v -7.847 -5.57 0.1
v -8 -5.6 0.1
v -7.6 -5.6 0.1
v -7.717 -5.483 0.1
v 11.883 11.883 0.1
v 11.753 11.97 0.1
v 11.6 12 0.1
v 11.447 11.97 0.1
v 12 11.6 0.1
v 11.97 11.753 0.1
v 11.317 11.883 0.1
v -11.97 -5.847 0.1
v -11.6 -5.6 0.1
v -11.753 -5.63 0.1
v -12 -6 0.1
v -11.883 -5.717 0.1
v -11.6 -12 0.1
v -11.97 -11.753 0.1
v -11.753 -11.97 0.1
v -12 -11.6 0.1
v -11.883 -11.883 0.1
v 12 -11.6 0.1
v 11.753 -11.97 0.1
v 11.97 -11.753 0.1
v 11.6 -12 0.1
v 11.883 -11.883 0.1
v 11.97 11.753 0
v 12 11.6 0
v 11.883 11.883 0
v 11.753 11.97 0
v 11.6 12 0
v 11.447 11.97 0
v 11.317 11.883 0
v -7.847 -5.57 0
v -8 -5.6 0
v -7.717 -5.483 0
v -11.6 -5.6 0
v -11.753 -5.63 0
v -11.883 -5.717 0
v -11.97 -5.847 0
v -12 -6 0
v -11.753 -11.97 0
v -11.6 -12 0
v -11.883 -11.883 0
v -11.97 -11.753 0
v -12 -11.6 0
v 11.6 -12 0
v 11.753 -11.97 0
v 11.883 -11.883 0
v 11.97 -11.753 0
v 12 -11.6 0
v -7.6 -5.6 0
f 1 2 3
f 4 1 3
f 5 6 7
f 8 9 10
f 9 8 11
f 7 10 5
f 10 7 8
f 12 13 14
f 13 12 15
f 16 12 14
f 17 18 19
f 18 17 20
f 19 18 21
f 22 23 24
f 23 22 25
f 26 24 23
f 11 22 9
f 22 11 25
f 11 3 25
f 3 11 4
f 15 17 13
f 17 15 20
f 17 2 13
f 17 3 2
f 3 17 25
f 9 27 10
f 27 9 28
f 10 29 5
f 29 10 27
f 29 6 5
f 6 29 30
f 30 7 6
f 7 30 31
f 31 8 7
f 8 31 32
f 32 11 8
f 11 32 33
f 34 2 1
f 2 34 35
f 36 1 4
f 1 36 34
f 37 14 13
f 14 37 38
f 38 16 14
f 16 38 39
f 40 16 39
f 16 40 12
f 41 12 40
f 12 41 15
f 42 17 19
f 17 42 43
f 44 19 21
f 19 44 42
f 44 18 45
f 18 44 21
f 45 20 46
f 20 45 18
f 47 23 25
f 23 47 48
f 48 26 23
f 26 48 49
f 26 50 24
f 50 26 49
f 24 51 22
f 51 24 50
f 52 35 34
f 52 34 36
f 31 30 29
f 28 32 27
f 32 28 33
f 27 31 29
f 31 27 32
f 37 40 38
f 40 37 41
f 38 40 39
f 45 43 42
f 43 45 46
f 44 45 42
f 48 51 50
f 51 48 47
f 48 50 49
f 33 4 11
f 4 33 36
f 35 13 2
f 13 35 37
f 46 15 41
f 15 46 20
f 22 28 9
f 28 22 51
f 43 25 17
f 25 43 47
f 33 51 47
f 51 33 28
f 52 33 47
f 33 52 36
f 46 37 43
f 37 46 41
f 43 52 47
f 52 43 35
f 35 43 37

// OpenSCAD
// file: ../p/3-8cyli.scad
use <../lib.scad>
function ldraw_lib__3_8cyli() = [
// 0 Cylinder 0.375
// 0 Name: 3-8cyli.dat
// 0 Author: James Jessiman
// 0 !LDRAW_ORG Primitive UPDATE 2005-01
// 0 !LICENSE Licensed under CC BY 2.0 and CC BY 4.0 : see CAreadme.txt
// 
// 0 BFC CERTIFY CCW
  [0,"BFC","CERTIFY"],
  [0,"BFC","CCW"],
// 
// 0 !HISTORY 2002-05-08 [OrionP] Made BFC compliant
// 0 !HISTORY 2002-08-18 [PTadmin] Official Update 2002-04
// 0 !HISTORY 2004-12-11 [nielsk] Recreated using Primitive Generator, Edge lines fixed, BFC changed to CCW
// 0 !HISTORY 2005-12-28 [PTadmin] Official Update 2005-01
// 0 !HISTORY 2007-06-24 [PTadmin] Header formatted for Contributor Agreement
// 0 !HISTORY 2008-07-01 [PTadmin] Official Update 2008-01
// 
// 
// 4 16 .9239 1 .3827 .9239 0 .3827 1 0 0 1 1 0
  [4,16,.9239,1,.3827,.9239,0,.3827,1,0,0,1,1,0],
// 4 16 .7071 1 .7071 .7071 0 .7071 .9239 0 .3827 .9239 1 .3827
  [4,16,.7071,1,.7071,.7071,0,.7071,.9239,0,.3827,.9239,1,.3827],
// 4 16 .3827 1 .9239 .3827 0 .9239 .7071 0 .7071 .7071 1 .7071
  [4,16,.3827,1,.9239,.3827,0,.9239,.7071,0,.7071,.7071,1,.7071],
// 4 16 0 1 1 0 0 1 .3827 0 .9239 .3827 1 .9239
  [4,16,0,1,1,0,0,1,.3827,0,.9239,.3827,1,.9239],
// 4 16 -.3827 1 .9239 -.3827 0 .9239 0 0 1 0 1 1
  [4,16,-.3827,1,.9239,-.3827,0,.9239,0,0,1,0,1,1],
// 4 16 -.7071 1 .7071 -.7071 0 .7071 -.3827 0 .9239 -.3827 1 .9239
  [4,16,-.7071,1,.7071,-.7071,0,.7071,-.3827,0,.9239,-.3827,1,.9239],
// 5 24 1 1 0 1 0 0 1 1 -.4142 .9239 1 .3827
  [5,24,1,1,0,1,0,0,1,1,-.4142,.9239,1,.3827],
// 5 24 .9239 1 .3827 .9239 0 .3827 1 1 0 .7071 1 .7071
  [5,24,.9239,1,.3827,.9239,0,.3827,1,1,0,.7071,1,.7071],
// 5 24 .7071 1 .7071 .7071 0 .7071 .9239 1 .3827 .3827 1 .9239
  [5,24,.7071,1,.7071,.7071,0,.7071,.9239,1,.3827,.3827,1,.9239],
// 5 24 .3827 1 .9239 .3827 0 .9239 .7071 1 .7071 0 1 1
  [5,24,.3827,1,.9239,.3827,0,.9239,.7071,1,.7071,0,1,1],
// 5 24 0 1 1 0 0 1 .3827 1 .9239 -.3827 1 .9239
  [5,24,0,1,1,0,0,1,.3827,1,.9239,-.3827,1,.9239],
// 5 24 -.3827 1 .9239 -.3827 0 .9239 0 1 1 -.7071 1 .7071
  [5,24,-.3827,1,.9239,-.3827,0,.9239,0,1,1,-.7071,1,.7071],
// 5 24 -.7071 1 .7071 -.7071 0 .7071 -.3827 1 .9239 -1 1 .4142
  [5,24,-.7071,1,.7071,-.7071,0,.7071,-.3827,1,.9239,-1,1,.4142],
// 0
];
module ldraw_lib__3_8cyli(step=0, col=false, unit=2/5, alt=false, line=0.2, solid=!$preview)
    makepoly(ldraw_lib__3_8cyli(), step=step, col=col, unit=unit, alt=alt, line=line, solid=solid);
ldraw_lib__3_8cyli(line=0.2);
// file: ../p/3-8chrd.scad
use <../lib.scad>
function ldraw_lib__3_8chrd() = [
// 0 Chord 0.375
// 0 Name: 3-8chrd.dat
// 0 Author: Donald Sutter [technog]
// 0 !LDRAW_ORG Primitive UPDATE 2005-01
// 0 !LICENSE Licensed under CC BY 2.0 and CC BY 4.0 : see CAreadme.txt
// 
// 0 BFC CERTIFY CCW
  [0,"BFC","CERTIFY"],
  [0,"BFC","CCW"],
// 
// 0 !HISTORY 2004-01-07 [Steffen] added primitive code for POVray
// 0 !HISTORY 2004-03-18 [mkennedy] removed pov code and rearanged polygons.
// 0 !HISTORY 2004-09-12 [cwdee] reversed winding and standardised precision
// 0 !HISTORY 2005-12-28 [PTadmin] Official Update 2005-01
// 0 !HISTORY 2007-06-24 [PTadmin] Header formatted for Contributor Agreement
// 0 !HISTORY 2008-07-01 [PTadmin] Official Update 2008-01
// 
// 
// 3 16 0.7071 0 0.7071 0.3827 0 0.9239 0 0 1
  [3,16,0.7071,0,0.7071,0.3827,0,0.9239,0,0,1],
// 4 16 0.9239 0 0.3827 -0.3827 0 0.9239 -0.7071 0 0.7071 1 0 0
  [4,16,0.9239,0,0.3827,-0.3827,0,0.9239,-0.7071,0,0.7071,1,0,0],
// 4 16 0.7071 0 0.7071 0 0 1 -0.3827 0 0.9239 0.9239 0 0.3827
  [4,16,0.7071,0,0.7071,0,0,1,-0.3827,0,0.9239,0.9239,0,0.3827],
// 0
];
module ldraw_lib__3_8chrd(step=0, col=false, unit=2/5, alt=false, line=0.2, solid=!$preview)
    makepoly(ldraw_lib__3_8chrd(), step=step, col=col, unit=unit, alt=alt, line=line, solid=solid);
ldraw_lib__3_8chrd(line=0.2);
// file: ../p/1-8ndis.scad
use <../lib.scad>
function ldraw_lib__1_8ndis() = [
// 0 Disc Negative 0.125
// 0 Name: 1-8ndis.dat
// 0 Author: James Jessiman
// 0 !LDRAW_ORG Primitive UPDATE 2012-01
// 0 !LICENSE Licensed under CC BY 2.0 and CC BY 4.0 : see CAreadme.txt
// 
// 0 BFC CERTIFY CCW
  [0,"BFC","CERTIFY"],
  [0,"BFC","CCW"],
// 
// 0 !HISTORY 2002-03-23 [sbliss] Added BFC statement
// 0 !HISTORY 2002-04-25 [PTadmin] Official Update 2002-02
// 0 !HISTORY 2007-06-22 [PTadmin] Header formatted for Contributor Agreement
// 0 !HISTORY 2008-07-01 [PTadmin] Official Update 2008-01
// 0 !HISTORY 2012-02-16 [Philo] Changed to CCW
// 0 !HISTORY 2012-03-30 [PTadmin] Official Update 2012-01
// 
// 
// 3 16 0.9239 0 0.3827 1 0 0 1 0 1
  [3,16,0.9239,0,0.3827,1,0,0,1,0,1],
// 3 16 0.7071 0 0.7071 0.9239 0 0.3827 1 0 1
  [3,16,0.7071,0,0.7071,0.9239,0,0.3827,1,0,1],
];
module ldraw_lib__1_8ndis(step=0, col=false, unit=2/5, alt=false, line=0.2, solid=!$preview)
    makepoly(ldraw_lib__1_8ndis(), step=step, col=col, unit=unit, alt=alt, line=line, solid=solid);
ldraw_lib__1_8ndis(line=0.2);
// file: ../p/1-8cyli.scad
use <../lib.scad>
function ldraw_lib__1_8cyli() = [
// 0 Cylinder 0.125
// 0 Name: 1-8cyli.dat
// 0 Author: James Jessiman
// 0 !LDRAW_ORG Primitive UPDATE 2005-01
// 0 !LICENSE Licensed under CC BY 2.0 and CC BY 4.0 : see CAreadme.txt
// 
// 0 BFC CERTIFY CCW
  [0,"BFC","CERTIFY"],
  [0,"BFC","CCW"],
// 
// 0 !HISTORY 2002-04-25 [PTadmin] Official Update 2002-02
// 0 !HISTORY 2004-12-11 [nielsk] Recreated using Primitive Generator, Edge lines fixed, BFC changed to CCW
// 0 !HISTORY 2005-12-28 [PTadmin] Official Update 2005-01
// 0 !HISTORY 2007-06-22 [PTadmin] Header formatted for Contributor Agreement
// 0 !HISTORY 2008-07-01 [PTadmin] Official Update 2008-01
// 
// 
// 4 16 .9239 1 .3827 .9239 0 .3827 1 0 0 1 1 0
  [4,16,.9239,1,.3827,.9239,0,.3827,1,0,0,1,1,0],
// 4 16 .7071 1 .7071 .7071 0 .7071 .9239 0 .3827 .9239 1 .3827
  [4,16,.7071,1,.7071,.7071,0,.7071,.9239,0,.3827,.9239,1,.3827],
// 5 24 1 1 0 1 0 0 1 1 -.4142 .9239 1 .3827
  [5,24,1,1,0,1,0,0,1,1,-.4142,.9239,1,.3827],
// 5 24 .9239 1 .3827 .9239 0 .3827 1 1 0 .7071 1 .7071
  [5,24,.9239,1,.3827,.9239,0,.3827,1,1,0,.7071,1,.7071],
// 5 24 .7071 1 .7071 .7071 0 .7071 .9239 1 .3827 .4142 1 1
  [5,24,.7071,1,.7071,.7071,0,.7071,.9239,1,.3827,.4142,1,1],
// 0
];
module ldraw_lib__1_8cyli(step=0, col=false, unit=2/5, alt=false, line=0.2, solid=!$preview)
    makepoly(ldraw_lib__1_8cyli(), step=step, col=col, unit=unit, alt=alt, line=line, solid=solid);
ldraw_lib__1_8cyli(line=0.2);
// file: ../p/1-4cyli.scad
use <../lib.scad>
function ldraw_lib__1_4cyli() = [
// 0 Cylinder 0.25
// 0 Name: 1-4cyli.dat
// 0 Author: James Jessiman
// 0 !LDRAW_ORG Primitive UPDATE 2012-01
// 0 !LICENSE Licensed under CC BY 2.0 and CC BY 4.0 : see CAreadme.txt
// 
// 0 BFC CERTIFY CCW
  [0,"BFC","CERTIFY"],
  [0,"BFC","CCW"],
// 
// 0 !HISTORY 2002-03-23 [sbliss] Added BFC statement.
// 0 !HISTORY 2002-04-25 [PTadmin] Official Update 2002-02
// 0 !HISTORY 2007-06-22 [PTadmin] Header formatted for Contributor Agreement
// 0 !HISTORY 2008-07-01 [PTadmin] Official Update 2008-01
// 0 !HISTORY 2012-02-16 [Philo] Changed to CCW
// 0 !HISTORY 2012-03-30 [PTadmin] Official Update 2012-01
// 
// 
// 4 16 1 1 0 0.9239 1 0.3827 0.9239 0 0.3827 1 0 0
  [4,16,1,1,0,0.9239,1,0.3827,0.9239,0,0.3827,1,0,0],
// 5 24 1 0 0 1 1 0 0.9239 0 0.3827 1 0 -1
  [5,24,1,0,0,1,1,0,0.9239,0,0.3827,1,0,-1],
// 4 16 0.9239 1 0.3827 0.7071 1 0.7071 0.7071 0 0.7071 0.9239 0 0.3827
  [4,16,0.9239,1,0.3827,0.7071,1,0.7071,0.7071,0,0.7071,0.9239,0,0.3827],
// 5 24 0.9239 0 0.3827 0.9239 1 0.3827 0.7071 0 0.7071 1 0 0
  [5,24,0.9239,0,0.3827,0.9239,1,0.3827,0.7071,0,0.7071,1,0,0],
// 4 16 0.7071 1 0.7071 0.3827 1 0.9239 0.3827 0 0.9239 0.7071 0 0.7071
  [4,16,0.7071,1,0.7071,0.3827,1,0.9239,0.3827,0,0.9239,0.7071,0,0.7071],
// 5 24 0.7071 0 0.7071 0.7071 1 0.7071 0.3827 0 0.9239 0.9239 0 0.3827
  [5,24,0.7071,0,0.7071,0.7071,1,0.7071,0.3827,0,0.9239,0.9239,0,0.3827],
// 4 16 0.3827 1 0.9239 0 1 1 0 0 1 0.3827 0 0.9239
  [4,16,0.3827,1,0.9239,0,1,1,0,0,1,0.3827,0,0.9239],
// 5 24 0.3827 0 0.9239 0.3827 1 0.9239 0 0 1 0.7071 0 0.7071
  [5,24,0.3827,0,0.9239,0.3827,1,0.9239,0,0,1,0.7071,0,0.7071],
// 5 24 0 0 1 0 1 1 0.3827 0 0.9239 -1 0 1
  [5,24,0,0,1,0,1,1,0.3827,0,0.9239,-1,0,1],
];
module ldraw_lib__1_4cyli(step=0, col=false, unit=2/5, alt=false, line=0.2, solid=!$preview)
    makepoly(ldraw_lib__1_4cyli(), step=step, col=col, unit=unit, alt=alt, line=line, solid=solid);
ldraw_lib__1_4cyli(line=0.2);
// file: ../p/1-4chrd.scad
use <../lib.scad>
function ldraw_lib__1_4chrd() = [
// 0 Chord 0.25
// 0 Name: 1-4chrd.dat
// 0 Author: Tony Hafner [hafhead]
// 0 !LDRAW_ORG Primitive UPDATE 2012-02
// 0 !LICENSE Licensed under CC BY 2.0 and CC BY 4.0 : see CAreadme.txt
// 
// 0 BFC CERTIFY CCW
  [0,"BFC","CERTIFY"],
  [0,"BFC","CCW"],
// 
// 0 !HISTORY 2004-04-22 [PTadmin] Official Update 2004-02
// 0 !HISTORY 2007-10-09 [PTadmin] Header formatted for Contributor Agreement
// 0 !HISTORY 2008-07-01 [PTadmin] Official Update 2008-01
// 0 !HISTORY 2012-08-02 [MMR1988] Re-creation with PrimGen2 and Rectifier
// 0 !HISTORY 2012-08-09 [PTadmin] Official Update 2012-02
// 
// 
// 4 16 0.9239 0 0.3827 0.3827 0 0.9239 0 0 1 1 0 0
  [4,16,0.9239,0,0.3827,0.3827,0,0.9239,0,0,1,1,0,0],
// 3 16 0.7071 0 0.7071 0.3827 0 0.9239 0.9239 0 0.3827
  [3,16,0.7071,0,0.7071,0.3827,0,0.9239,0.9239,0,0.3827],
];
module ldraw_lib__1_4chrd(step=0, col=false, unit=2/5, alt=false, line=0.2, solid=!$preview)
    makepoly(ldraw_lib__1_4chrd(), step=step, col=col, unit=unit, alt=alt, line=line, solid=solid);
ldraw_lib__1_4chrd(line=0.2);
// main file
use <../lib.scad>
use <../p/1-4chrd.scad>
use <../p/1-4cyli.scad>
use <../p/1-8cyli.scad>
use <../p/1-8ndis.scad>
use <../p/3-8chrd.scad>
use <../p/3-8cyli.scad>
function ldraw_lib__4111899e() = [
// 0 Sticker  3.0 x  3.0 Polygon Yellow - Aligned Right
// 0 Name: 4111899e.dat
// 0 Author: Ulrich Röder [UR]
// 0 !LDRAW_ORG Part UPDATE 2020-03
// 0 !LICENSE Licensed under CC BY 2.0 and CC BY 4.0 : see CAreadme.txt
// 
// 0 BFC CERTIFY CCW
  [0,"BFC","CERTIFY"],
  [0,"BFC","CCW"],
// 
// 0 !KEYWORDS Black Thunder, helicopter, Set 5542
// 
// 0 !HISTORY 2020-12-29 [PTadmin] Official Update 2020-03
// 
// 
// 1 14 -20 -.25 -13 0 0 1 0 1 0 -1 0 0 1-8ndis.dat
  [1,14,-20,-.25,-13,0,0,1,0,1,0,-1,0,0, ldraw_lib__1_8ndis()],
// 1 14 29 -.25 29 1 0 0 0 1 0 0 0 1 3-8chrd.dat
  [1,14,29,-.25,29,1,0,0,0,1,0,0,0,1, ldraw_lib__3_8chrd()],
// 1 14 -29 -.25 -15 0 0 -1 0 1 0 1 0 0 1-4chrd.dat
  [1,14,-29,-.25,-15,0,0,-1,0,1,0,1,0,0, ldraw_lib__1_4chrd()],
// 1 14 -29 -.25 -29 0 0 -1 0 1 0 -1 0 0 1-4chrd.dat
  [1,14,-29,-.25,-29,0,0,-1,0,1,0,-1,0,0, ldraw_lib__1_4chrd()],
// 1 14 29 -.25 -29 0 0 1 0 1 0 -1 0 0 1-4chrd.dat
  [1,14,29,-.25,-29,0,0,1,0,1,0,-1,0,0, ldraw_lib__1_4chrd()],
// 4 14 30 -.25 -29 30 -.25 29 28.2929 -.25 29.7071 29 -.25 -30
  [4,14,30,-.25,-29,30,-.25,29,28.2929,-.25,29.7071,29,-.25,-30],
// 4 14 28.2929 -.25 29.7071 -19.2929 -.25 -13.7071 -19 -.25 -14 29 -.25 -30
  [4,14,28.2929,-.25,29.7071,-19.2929,-.25,-13.7071,-19,-.25,-14,29,-.25,-30],
// 4 14 -30 -.25 -15 -30 -.25 -29 -29 -.25 -30 -29 -.25 -14
  [4,14,-30,-.25,-15,-30,-.25,-29,-29,-.25,-30,-29,-.25,-14],
// 3 14 -29 -.25 -30 -20 -.25 -14 -29 -.25 -14
  [3,14,-29,-.25,-30,-20,-.25,-14,-29,-.25,-14],
// 4 14 -20 -.25 -14 -29 -.25 -30 29 -.25 -30 -19 -.25 -14
  [4,14,-20,-.25,-14,-29,-.25,-30,29,-.25,-30,-19,-.25,-14],
// 
// 1 16 29 0 29 1 0 0 0 -.25 0 0 0 1 3-8cyli.dat
  [1,16,29,0,29,1,0,0,0,-.25,0,0,0,1, ldraw_lib__3_8cyli()],
// 0 BFC INVERTNEXT
  [0,"BFC","INVERTNEXT"],
// 1 16 -20 0 -13 0 0 1 0 -.25 0 -1 0 0 1-8cyli.dat
  [1,16,-20,0,-13,0,0,1,0,-.25,0,-1,0,0, ldraw_lib__1_8cyli()],
// 1 16 -29 0 -15 0 0 -1 0 -.25 0 1 0 0 1-4cyli.dat
  [1,16,-29,0,-15,0,0,-1,0,-.25,0,1,0,0, ldraw_lib__1_4cyli()],
// 1 16 -29 0 -29 0 0 -1 0 -.25 0 -1 0 0 1-4cyli.dat
  [1,16,-29,0,-29,0,0,-1,0,-.25,0,-1,0,0, ldraw_lib__1_4cyli()],
// 1 16 29 0 -29 0 0 1 0 -.25 0 -1 0 0 1-4cyli.dat
  [1,16,29,0,-29,0,0,1,0,-.25,0,-1,0,0, ldraw_lib__1_4cyli()],
// 1 16 -20 0 -13 0 0 1 0 -1 0 -1 0 0 1-8ndis.dat
  [1,16,-20,0,-13,0,0,1,0,-1,0,-1,0,0, ldraw_lib__1_8ndis()],
// 1 16 29 0 29 1 0 0 0 -1 0 0 0 1 3-8chrd.dat
  [1,16,29,0,29,1,0,0,0,-1,0,0,0,1, ldraw_lib__3_8chrd()],
// 1 16 -29 0 -15 0 0 -1 0 -1 0 1 0 0 1-4chrd.dat
  [1,16,-29,0,-15,0,0,-1,0,-1,0,1,0,0, ldraw_lib__1_4chrd()],
// 1 16 -29 0 -29 0 0 -1 0 -1 0 -1 0 0 1-4chrd.dat
  [1,16,-29,0,-29,0,0,-1,0,-1,0,-1,0,0, ldraw_lib__1_4chrd()],
// 1 16 29 0 -29 0 0 1 0 -1 0 -1 0 0 1-4chrd.dat
  [1,16,29,0,-29,0,0,1,0,-1,0,-1,0,0, ldraw_lib__1_4chrd()],
// 4 16 28.2929 -.25 29.7071 28.2929 0 29.7071 -19.2929 0 -13.7071 -19.2929 -.25 -13.7071
  [4,16,28.2929,-.25,29.7071,28.2929,0,29.7071,-19.2929,0,-13.7071,-19.2929,-.25,-13.7071],
// 4 16 -20 -.25 -14 -20 0 -14 -29 0 -14 -29 -.25 -14
  [4,16,-20,-.25,-14,-20,0,-14,-29,0,-14,-29,-.25,-14],
// 4 16 -30 -.25 -15 -30 0 -15 -30 0 -29 -30 -.25 -29
  [4,16,-30,-.25,-15,-30,0,-15,-30,0,-29,-30,-.25,-29],
// 4 16 30 0 -29 30 0 29 30 -.25 29 30 -.25 -29
  [4,16,30,0,-29,30,0,29,30,-.25,29,30,-.25,-29],
// 4 16 -29 -.25 -30 -29 0 -30 29 0 -30 29 -.25 -30
  [4,16,-29,-.25,-30,-29,0,-30,29,0,-30,29,-.25,-30],
// 4 16 28.2929 0 29.7071 30 0 29 30 0 -29 29 0 -30
  [4,16,28.2929,0,29.7071,30,0,29,30,0,-29,29,0,-30],
// 4 16 -19 0 -14 -19.2929 0 -13.7071 28.2929 0 29.7071 29 0 -30
  [4,16,-19,0,-14,-19.2929,0,-13.7071,28.2929,0,29.7071,29,0,-30],
// 4 16 -29 0 -30 -30 0 -29 -30 0 -15 -29 0 -14
  [4,16,-29,0,-30,-30,0,-29,-30,0,-15,-29,0,-14],
// 4 16 29 0 -30 -29 0 -30 -20 0 -14 -19 0 -14
  [4,16,29,0,-30,-29,0,-30,-20,0,-14,-19,0,-14],
// 3 16 -20 0 -14 -29 0 -30 -29 0 -14
  [3,16,-20,0,-14,-29,0,-30,-29,0,-14],
];
module ldraw_lib__4111899e(step=0, col=false, unit=2/5, alt=false, line=0.2, solid=!$preview)
    makepoly(ldraw_lib__4111899e(), step=step, col=col, unit=unit, alt=alt, line=line, solid=solid);
ldraw_lib__4111899e(line=0.2);
